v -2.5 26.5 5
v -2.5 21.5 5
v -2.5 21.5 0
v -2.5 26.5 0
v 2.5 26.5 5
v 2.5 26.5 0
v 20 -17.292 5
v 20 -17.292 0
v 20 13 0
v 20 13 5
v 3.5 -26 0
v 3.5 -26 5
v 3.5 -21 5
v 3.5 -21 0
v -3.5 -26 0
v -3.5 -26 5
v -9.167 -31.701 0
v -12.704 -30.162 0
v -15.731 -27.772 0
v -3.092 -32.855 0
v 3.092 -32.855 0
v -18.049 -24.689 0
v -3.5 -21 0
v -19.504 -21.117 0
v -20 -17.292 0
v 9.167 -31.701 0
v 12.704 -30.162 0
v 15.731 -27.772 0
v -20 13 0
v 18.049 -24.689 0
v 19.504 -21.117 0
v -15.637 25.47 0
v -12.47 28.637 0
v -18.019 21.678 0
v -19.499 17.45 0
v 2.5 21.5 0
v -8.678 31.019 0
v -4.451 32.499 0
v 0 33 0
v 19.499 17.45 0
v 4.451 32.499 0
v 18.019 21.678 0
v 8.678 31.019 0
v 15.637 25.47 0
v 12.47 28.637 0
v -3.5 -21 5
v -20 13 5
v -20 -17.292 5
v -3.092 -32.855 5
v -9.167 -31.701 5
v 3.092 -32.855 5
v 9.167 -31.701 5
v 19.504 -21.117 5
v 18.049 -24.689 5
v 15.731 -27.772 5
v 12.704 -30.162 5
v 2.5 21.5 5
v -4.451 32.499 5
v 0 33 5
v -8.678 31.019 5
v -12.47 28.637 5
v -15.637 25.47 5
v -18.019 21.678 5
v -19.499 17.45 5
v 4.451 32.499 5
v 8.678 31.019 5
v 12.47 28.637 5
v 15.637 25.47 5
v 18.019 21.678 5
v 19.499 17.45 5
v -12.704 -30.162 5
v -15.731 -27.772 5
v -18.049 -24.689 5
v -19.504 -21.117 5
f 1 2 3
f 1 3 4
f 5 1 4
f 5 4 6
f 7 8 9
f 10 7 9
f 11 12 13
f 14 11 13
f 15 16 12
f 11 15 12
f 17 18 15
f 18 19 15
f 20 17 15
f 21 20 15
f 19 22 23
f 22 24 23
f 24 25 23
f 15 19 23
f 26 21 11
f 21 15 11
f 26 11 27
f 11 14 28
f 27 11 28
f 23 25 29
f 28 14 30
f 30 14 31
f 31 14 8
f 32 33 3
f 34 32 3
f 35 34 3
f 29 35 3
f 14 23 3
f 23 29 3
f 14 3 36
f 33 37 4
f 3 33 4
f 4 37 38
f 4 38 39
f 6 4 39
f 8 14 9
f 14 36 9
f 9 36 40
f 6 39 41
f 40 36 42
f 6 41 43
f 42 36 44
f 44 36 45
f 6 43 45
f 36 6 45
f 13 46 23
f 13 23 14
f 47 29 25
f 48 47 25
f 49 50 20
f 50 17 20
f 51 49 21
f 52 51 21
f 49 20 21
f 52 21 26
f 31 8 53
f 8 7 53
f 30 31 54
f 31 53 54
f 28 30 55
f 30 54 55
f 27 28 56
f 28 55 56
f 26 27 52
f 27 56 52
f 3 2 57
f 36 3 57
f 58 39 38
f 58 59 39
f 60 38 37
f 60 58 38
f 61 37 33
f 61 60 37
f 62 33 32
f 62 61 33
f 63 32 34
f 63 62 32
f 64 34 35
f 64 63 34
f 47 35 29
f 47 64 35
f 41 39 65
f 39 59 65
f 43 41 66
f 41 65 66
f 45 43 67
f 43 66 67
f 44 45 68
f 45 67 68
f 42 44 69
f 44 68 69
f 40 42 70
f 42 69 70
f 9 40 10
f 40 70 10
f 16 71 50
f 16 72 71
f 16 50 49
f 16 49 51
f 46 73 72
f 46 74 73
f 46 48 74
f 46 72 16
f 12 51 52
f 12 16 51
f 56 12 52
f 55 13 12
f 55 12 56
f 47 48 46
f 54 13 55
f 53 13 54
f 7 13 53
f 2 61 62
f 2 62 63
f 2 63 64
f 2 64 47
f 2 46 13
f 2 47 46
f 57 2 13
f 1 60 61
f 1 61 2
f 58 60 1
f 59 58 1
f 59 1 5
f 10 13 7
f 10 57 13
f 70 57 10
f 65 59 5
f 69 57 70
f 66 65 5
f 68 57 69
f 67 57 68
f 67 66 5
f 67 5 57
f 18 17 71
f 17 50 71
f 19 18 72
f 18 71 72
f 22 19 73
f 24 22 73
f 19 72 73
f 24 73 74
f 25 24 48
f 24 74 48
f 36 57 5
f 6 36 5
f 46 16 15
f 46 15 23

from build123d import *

# Parameters (mm, degrees)
SKETCH1_R           = 33
BOSS_EXTRUDE1_DEPTH = 5
CUT_EXTRUDE3_START  = -10
CUT_EXTRUDE3_DEPTH  = 10
FILLET2_R           = 20
FILLET3_R           = 15
SKETCH7_W           = 5
SKETCH7_H           = 5
SKETCH7_W_2         = 7
CUT_EXTRUDE4_DEPTH  = 10


with BuildPart() as part:
    # Sketch1 → Boss-Extrude1 (new body)
    with BuildSketch(Plane.XY):
        Circle(SKETCH1_R)
    extrude(amount=BOSS_EXTRUDE1_DEPTH)

    # Sketch6 → Cut-Extrude3 (cut)
    with BuildSketch(Plane.XY.offset(5).offset(CUT_EXTRUDE3_START)):
        with BuildLine():
            Line((-20, 26.248809497), (-20, -26.248809497))
            ThreePointArc((-20, -26.248809497), (-33, 0), (-20, 26.248809497))
        make_face()
        with BuildLine():
            Line((20, -26.248809497), (20, 26.248809497))
            ThreePointArc((20, 26.248809497), (33, 0), (20, -26.248809497))
        make_face()
    extrude(amount=CUT_EXTRUDE3_DEPTH, mode=Mode.SUBTRACT)

    # Fillet2
    fillet2_edges = [part.edges().sort_by_distance(p)[0] for p in [
        (-20, 26.248809497, 2.5),
        (20, 26.248809497, 2.5),
    ]]
    fillet(fillet2_edges, radius=FILLET2_R - 0.0001)  # a hair under: the kernel refuses the full size

    # Fillet3
    fillet3_edges = [part.edges().sort_by_distance(p)[0] for p in [
        (-20, -26.248809497, 2.5),
        (20, -26.248809497, 2.5),
    ]]
    fillet(fillet3_edges, radius=FILLET3_R)

    # Sketch7 → Cut-Extrude4 (cut)
    with BuildSketch(Plane.XY.offset(5)):
        with Locations((0, 24)):
            Rectangle(SKETCH7_W, SKETCH7_H)
        with Locations((0, -23.5)):
            Rectangle(SKETCH7_W_2, SKETCH7_H)
    extrude(amount=-CUT_EXTRUDE4_DEPTH, mode=Mode.SUBTRACT)


solid = part.part
